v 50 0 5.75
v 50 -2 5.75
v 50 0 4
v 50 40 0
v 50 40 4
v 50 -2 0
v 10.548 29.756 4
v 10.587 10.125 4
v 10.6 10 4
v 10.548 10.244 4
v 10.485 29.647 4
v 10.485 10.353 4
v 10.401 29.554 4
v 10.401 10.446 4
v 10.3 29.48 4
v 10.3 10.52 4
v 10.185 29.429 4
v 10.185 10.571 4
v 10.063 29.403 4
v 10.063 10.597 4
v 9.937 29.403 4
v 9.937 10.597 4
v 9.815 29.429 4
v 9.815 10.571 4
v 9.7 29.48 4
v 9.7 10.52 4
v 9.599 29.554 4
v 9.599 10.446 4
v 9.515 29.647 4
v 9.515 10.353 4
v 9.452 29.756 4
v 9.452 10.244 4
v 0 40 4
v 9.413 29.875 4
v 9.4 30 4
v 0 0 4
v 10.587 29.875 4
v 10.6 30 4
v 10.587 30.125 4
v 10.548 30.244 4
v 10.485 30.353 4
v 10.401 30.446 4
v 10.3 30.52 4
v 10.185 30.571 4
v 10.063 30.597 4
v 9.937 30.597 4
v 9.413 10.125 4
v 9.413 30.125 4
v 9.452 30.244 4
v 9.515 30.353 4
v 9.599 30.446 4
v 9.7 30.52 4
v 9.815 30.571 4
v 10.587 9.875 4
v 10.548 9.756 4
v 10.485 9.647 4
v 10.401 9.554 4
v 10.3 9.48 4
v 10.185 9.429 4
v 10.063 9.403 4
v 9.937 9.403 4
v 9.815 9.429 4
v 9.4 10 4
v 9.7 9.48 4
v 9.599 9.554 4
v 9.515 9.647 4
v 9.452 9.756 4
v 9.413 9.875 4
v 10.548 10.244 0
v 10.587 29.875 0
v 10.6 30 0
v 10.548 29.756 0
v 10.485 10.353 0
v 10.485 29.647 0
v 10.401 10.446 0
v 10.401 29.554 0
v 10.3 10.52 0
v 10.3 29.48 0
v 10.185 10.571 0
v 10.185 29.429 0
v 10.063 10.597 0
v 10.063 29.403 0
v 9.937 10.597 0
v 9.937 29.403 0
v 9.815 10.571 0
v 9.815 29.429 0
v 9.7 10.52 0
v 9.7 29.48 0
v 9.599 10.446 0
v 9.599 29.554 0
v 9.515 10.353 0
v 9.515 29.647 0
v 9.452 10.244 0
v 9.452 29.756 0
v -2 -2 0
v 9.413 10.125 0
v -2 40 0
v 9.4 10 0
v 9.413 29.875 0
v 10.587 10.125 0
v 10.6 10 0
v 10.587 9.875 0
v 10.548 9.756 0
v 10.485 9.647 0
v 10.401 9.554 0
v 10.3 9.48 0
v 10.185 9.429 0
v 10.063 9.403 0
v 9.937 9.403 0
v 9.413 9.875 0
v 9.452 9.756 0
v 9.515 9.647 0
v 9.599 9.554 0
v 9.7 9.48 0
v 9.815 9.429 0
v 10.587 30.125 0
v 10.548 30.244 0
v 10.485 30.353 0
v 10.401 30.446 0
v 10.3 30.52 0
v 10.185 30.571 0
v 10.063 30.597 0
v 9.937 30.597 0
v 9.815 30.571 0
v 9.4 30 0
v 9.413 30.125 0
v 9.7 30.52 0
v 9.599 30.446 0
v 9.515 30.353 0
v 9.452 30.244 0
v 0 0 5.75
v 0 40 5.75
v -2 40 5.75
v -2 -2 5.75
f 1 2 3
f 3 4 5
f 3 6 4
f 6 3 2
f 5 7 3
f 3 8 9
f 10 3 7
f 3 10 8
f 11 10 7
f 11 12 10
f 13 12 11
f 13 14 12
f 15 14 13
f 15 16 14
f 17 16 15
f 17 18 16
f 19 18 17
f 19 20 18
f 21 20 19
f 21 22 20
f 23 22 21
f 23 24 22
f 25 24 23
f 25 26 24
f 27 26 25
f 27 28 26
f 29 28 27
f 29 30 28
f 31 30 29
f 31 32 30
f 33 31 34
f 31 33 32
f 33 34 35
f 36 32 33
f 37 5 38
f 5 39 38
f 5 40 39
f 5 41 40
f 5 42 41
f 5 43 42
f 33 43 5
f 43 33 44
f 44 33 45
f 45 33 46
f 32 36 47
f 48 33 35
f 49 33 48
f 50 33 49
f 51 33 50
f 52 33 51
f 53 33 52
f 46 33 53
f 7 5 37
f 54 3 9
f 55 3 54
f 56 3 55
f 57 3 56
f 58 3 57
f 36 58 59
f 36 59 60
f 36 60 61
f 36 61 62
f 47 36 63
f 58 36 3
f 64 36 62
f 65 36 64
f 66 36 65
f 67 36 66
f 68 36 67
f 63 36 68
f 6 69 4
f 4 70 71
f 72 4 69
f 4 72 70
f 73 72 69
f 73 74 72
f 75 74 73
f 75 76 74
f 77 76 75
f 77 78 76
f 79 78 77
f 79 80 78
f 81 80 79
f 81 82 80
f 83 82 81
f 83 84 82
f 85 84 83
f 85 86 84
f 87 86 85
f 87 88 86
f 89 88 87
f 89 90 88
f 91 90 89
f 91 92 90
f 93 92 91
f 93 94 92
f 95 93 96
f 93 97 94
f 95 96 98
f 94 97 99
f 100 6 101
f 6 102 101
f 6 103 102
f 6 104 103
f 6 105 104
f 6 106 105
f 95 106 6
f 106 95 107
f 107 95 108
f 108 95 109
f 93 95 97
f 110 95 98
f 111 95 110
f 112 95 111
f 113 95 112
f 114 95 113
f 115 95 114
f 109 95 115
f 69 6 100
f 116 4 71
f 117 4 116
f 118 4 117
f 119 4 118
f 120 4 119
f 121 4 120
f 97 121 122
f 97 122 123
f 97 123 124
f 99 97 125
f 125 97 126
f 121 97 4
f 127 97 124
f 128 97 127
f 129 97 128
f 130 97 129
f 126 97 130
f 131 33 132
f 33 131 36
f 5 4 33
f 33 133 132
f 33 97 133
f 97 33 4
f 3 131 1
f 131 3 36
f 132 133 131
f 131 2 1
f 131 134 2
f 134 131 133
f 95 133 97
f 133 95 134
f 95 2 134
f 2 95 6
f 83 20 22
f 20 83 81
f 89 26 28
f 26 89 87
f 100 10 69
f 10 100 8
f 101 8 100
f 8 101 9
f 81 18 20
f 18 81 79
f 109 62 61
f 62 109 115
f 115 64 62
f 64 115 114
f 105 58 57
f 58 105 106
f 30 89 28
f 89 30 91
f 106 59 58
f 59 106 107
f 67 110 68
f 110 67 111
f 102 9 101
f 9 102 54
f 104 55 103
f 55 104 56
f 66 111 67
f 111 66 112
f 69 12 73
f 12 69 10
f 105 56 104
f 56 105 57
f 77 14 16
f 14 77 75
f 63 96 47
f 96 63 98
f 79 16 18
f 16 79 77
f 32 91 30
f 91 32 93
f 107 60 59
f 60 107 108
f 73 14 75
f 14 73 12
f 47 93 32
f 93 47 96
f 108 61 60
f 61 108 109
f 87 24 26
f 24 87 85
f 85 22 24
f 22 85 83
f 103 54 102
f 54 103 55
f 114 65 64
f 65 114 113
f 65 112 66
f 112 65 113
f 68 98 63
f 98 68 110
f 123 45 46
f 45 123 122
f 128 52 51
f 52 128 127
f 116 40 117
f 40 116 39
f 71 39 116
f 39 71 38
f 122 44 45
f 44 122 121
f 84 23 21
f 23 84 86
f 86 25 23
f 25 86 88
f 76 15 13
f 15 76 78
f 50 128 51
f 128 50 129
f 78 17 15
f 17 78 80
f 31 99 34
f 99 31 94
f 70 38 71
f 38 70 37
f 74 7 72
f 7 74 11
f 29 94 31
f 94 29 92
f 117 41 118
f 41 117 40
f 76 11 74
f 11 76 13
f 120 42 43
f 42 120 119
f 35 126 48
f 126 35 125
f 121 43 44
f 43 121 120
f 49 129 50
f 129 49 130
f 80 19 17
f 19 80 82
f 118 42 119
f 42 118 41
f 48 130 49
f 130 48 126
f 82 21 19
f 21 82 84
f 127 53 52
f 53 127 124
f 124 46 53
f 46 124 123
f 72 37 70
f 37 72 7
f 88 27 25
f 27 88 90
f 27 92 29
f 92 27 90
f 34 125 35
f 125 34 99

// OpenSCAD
// PCB Drilling Template for Pin Alignment
// Generated by LaserResist
//
// This template creates a drilling guide with:
// - A rectangular block matching the board dimensions
// - Two pin alignment holes at specified positions
// - Walls on the left and bottom edges for alignment

// Board dimensions (passed via -D parameters)
board_width = 50.0;      // Board width in mm
board_height = 40.0;     // Board height in mm

// Template parameters
block_height = 4.0;      // Height of the main block in mm
wall_thickness = 2.0;    // Thickness of the alignment walls in mm
wall_extra_height = 1.75; // Extra height for walls above block in mm
hole_print_tolerance = 0.2; // Extra diameter for 3D print compensation in mm

// Pin 1 (bottom pin) - position and diameter
pin1_x = 10.0;
pin1_y = 10.0;
pin1_diameter = 1.0;

// Pin 2 (top pin) - position and diameter
pin2_x = 10.0;
pin2_y = 30.0;
pin2_diameter = 1.0;

// Total wall height
wall_height = block_height + wall_extra_height;

// Main assembly
difference() {
    union() {
        // Main block
        cube([board_width, board_height, block_height]);

        // Left wall (outward, on -X side)
        translate([-wall_thickness, 0, 0])
            cube([wall_thickness, board_height, wall_height]);

        // Bottom wall (outward, on -Y side)
        translate([-wall_thickness, -wall_thickness, 0])
            cube([board_width + wall_thickness, wall_thickness, wall_height]);
    }

    // Pin 1 hole (bottom pin) - with print tolerance
    translate([pin1_x, pin1_y, -0.5])
        cylinder(h=block_height + 1, r=(pin1_diameter + hole_print_tolerance)/2, $fn=30);

    // Pin 2 hole (top pin) - with print tolerance
    translate([pin2_x, pin2_y, -0.5])
        cylinder(h=block_height + 1, r=(pin2_diameter + hole_print_tolerance)/2, $fn=30);
}

// Render settings for smooth circles
$fa = 1;
$fs = 0.4;
